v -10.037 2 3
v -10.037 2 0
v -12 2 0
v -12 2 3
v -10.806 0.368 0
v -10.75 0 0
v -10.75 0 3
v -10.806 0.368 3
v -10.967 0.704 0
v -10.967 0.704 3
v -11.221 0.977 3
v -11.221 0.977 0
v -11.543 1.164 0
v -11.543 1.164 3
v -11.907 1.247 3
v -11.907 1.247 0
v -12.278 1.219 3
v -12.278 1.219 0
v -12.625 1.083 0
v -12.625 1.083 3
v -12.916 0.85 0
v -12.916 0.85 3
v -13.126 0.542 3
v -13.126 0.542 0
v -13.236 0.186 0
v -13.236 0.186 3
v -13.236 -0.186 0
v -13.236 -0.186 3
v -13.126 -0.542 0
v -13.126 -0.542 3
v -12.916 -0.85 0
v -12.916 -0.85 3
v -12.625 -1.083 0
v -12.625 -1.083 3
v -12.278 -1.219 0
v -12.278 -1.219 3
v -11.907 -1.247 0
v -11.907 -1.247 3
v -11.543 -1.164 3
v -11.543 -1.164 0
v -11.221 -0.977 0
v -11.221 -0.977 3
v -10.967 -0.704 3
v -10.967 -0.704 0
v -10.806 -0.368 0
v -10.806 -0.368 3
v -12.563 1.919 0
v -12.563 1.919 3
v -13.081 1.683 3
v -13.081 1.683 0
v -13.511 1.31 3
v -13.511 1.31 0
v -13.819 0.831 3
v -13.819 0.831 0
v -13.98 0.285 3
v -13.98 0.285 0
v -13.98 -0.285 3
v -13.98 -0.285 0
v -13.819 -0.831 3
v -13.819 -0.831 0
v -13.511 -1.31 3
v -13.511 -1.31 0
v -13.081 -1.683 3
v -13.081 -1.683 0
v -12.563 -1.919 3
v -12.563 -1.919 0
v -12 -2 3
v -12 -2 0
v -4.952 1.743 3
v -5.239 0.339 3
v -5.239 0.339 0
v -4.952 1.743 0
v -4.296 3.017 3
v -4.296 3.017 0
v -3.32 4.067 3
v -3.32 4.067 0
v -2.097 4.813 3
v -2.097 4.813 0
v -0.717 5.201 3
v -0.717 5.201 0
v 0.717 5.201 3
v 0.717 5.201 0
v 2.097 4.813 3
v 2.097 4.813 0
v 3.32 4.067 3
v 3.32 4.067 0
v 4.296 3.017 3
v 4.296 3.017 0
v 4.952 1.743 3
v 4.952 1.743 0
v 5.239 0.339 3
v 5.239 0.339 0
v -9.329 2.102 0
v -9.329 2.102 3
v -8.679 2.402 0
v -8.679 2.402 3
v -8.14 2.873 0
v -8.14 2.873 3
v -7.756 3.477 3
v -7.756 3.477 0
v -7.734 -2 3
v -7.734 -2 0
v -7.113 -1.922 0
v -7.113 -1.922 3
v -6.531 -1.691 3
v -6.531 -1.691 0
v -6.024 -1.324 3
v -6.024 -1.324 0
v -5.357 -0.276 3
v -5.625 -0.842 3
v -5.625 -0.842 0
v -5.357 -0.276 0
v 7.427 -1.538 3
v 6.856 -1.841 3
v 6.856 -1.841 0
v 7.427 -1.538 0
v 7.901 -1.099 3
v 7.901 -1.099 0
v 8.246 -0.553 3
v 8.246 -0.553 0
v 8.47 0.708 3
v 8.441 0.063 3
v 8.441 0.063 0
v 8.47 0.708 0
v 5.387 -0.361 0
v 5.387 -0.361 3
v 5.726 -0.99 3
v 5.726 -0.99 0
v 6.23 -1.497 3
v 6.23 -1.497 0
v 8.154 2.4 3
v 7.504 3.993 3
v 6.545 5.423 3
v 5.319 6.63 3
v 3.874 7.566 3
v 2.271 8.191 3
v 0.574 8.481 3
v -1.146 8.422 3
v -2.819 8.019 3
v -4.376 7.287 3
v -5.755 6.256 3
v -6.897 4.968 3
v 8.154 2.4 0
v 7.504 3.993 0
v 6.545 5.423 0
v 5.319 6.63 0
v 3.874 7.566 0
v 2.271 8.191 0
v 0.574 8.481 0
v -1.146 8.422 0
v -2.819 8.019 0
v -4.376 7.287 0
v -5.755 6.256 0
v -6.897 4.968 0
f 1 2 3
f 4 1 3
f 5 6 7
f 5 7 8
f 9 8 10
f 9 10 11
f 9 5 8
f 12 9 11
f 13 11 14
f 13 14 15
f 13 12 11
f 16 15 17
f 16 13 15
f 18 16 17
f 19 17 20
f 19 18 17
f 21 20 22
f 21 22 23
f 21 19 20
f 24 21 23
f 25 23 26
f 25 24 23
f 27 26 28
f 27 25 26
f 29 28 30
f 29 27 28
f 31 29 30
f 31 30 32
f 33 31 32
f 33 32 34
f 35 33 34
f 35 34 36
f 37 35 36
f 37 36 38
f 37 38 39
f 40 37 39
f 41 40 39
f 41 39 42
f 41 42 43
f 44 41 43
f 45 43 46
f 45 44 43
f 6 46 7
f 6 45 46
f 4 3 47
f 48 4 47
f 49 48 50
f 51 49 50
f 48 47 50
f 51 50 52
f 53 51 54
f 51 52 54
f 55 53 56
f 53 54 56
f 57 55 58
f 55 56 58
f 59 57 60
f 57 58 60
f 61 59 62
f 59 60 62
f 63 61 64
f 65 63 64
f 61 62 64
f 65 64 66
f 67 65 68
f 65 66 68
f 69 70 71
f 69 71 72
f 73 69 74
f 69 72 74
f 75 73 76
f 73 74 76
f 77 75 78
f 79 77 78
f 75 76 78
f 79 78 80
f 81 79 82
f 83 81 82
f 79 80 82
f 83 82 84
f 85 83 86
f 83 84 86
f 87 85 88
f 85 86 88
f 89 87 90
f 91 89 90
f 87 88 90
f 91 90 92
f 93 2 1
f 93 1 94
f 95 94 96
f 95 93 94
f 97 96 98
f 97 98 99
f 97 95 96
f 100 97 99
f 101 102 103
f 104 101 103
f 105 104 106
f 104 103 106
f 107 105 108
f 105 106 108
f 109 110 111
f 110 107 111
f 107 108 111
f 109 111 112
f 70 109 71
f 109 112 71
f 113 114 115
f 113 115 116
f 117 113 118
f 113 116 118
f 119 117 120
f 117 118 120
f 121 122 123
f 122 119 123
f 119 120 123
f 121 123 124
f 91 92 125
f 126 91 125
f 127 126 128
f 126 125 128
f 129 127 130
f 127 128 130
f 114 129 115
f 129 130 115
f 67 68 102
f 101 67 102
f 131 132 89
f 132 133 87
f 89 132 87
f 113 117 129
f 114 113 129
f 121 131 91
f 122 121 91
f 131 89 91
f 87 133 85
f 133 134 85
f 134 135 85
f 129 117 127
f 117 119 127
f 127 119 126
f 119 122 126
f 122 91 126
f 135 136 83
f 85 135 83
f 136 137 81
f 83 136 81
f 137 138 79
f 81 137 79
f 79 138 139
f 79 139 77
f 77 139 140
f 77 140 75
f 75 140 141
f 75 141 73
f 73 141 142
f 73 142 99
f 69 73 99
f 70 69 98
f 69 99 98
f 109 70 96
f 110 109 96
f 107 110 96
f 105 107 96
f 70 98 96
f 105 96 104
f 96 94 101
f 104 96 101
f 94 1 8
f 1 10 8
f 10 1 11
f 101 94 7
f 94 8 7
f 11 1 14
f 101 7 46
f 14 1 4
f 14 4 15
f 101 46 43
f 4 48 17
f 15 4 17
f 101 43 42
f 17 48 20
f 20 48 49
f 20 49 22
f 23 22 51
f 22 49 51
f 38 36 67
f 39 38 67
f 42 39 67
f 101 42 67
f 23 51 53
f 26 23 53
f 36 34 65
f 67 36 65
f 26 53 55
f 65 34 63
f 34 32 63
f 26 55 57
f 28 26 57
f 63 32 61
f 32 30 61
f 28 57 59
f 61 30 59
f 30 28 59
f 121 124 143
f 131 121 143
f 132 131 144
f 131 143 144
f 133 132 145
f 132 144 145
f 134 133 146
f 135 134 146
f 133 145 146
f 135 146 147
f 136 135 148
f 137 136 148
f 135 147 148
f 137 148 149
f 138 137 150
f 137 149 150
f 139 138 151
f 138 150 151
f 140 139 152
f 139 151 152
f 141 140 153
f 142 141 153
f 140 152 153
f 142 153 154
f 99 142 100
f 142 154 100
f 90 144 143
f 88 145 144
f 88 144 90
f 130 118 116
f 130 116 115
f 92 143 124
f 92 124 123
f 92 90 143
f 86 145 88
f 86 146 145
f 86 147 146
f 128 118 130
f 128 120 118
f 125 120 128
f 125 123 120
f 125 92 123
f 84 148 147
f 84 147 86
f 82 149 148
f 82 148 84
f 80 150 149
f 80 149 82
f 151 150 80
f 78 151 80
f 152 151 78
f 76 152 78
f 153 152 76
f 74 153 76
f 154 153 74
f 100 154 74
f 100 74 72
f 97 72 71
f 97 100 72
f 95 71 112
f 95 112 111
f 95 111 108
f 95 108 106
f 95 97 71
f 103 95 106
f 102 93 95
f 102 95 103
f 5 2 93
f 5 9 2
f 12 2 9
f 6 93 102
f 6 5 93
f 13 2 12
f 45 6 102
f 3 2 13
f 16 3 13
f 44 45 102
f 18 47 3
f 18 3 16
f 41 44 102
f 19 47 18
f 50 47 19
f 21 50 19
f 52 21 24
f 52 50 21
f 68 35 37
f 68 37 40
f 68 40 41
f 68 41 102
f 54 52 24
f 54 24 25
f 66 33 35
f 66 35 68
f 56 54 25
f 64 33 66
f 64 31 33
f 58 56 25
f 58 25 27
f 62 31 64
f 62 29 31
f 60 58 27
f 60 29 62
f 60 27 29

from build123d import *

# Parameters (mm, degrees)
SKETCH_1_R      = 1.25
EXTRUDE_1_DEPTH = 3
FILLET_2_R      = 2.5


with BuildPart() as part:
    # Эскиз1 → Бобышка-Вытянуть1 (new body)
    with BuildSketch(Plane.XY):
        with BuildLine():
            Line((-12, -2), (-4.85412196, -2))
            ThreePointArc((-4.85412196, -2), (0, 5.25), (4.85412196, -2))
            Line((4.85412196, -2), (8.261355821, -2))
            ThreePointArc((8.261355821, -2), (2, 8.261355821), (-8.261355821, 2))
            Line((-8.261355821, 2), (-12, 2))
            ThreePointArc((-12, 2), (-14, 0), (-12, -2))
        make_face()
        with Locations((-12, 0)):
            Circle(SKETCH_1_R, mode=Mode.SUBTRACT)
    extrude(amount=EXTRUDE_1_DEPTH)

    # Скругление2
    # the kernel refuses this fillet: 2.5 mm, written as the material it adds along each edge
    with BuildSketch(Plane(origin=(-8.261355821, 2, 0), x_dir=(0.3235599082125896, 0.9462076863973683, 0), z_dir=(0, 0, 1))) as fillet_2_piece_1:
        with BuildLine():
            CenterArc((1.790852834, 2.489434763), FILLET_2_R, 198.878350274, 65.852260083)
            Line((-0.574666382, 1.680534992), (0, 0))
            ThreePointArc((0, 0), (0.780628158, 0.035921806), (1.561256317, 0))
        make_face()
    extrude(amount=3)
    # the kernel refuses this fillet: 2.5 mm, written as the material it takes off along each edge
    with BuildSketch(Plane(origin=(8.261355821, -2, -6.790979044), x_dir=(-1, 0, 0), z_dir=(0, 0, 1))) as fillet_2_2_piece_1:
        with BuildLine():
            CenterArc((2.282225449, -2.5), FILLET_2_R, 90, 94.780191847)
            ThreePointArc((-0.209078872, -2.708333333), (-0.21342859, -1.345760603), (0, 0))
            Line((0, 0), (2.282225449, 0))
        make_face()
    extrude(amount=16.581958087, mode=Mode.SUBTRACT)
    with BuildSketch(Plane(origin=(4.85412196, -2, -7.199330473), x_dir=(0.16240998892159433, 0.9867233632069768, 0), z_dir=(0, 0, 1))) as fillet_2_2_piece_2:
        with BuildLine():
            CenterArc((2.934505681, -2.435474059), FILLET_2_R, 103.045879434, 86.300928937)
            Line((0.467697273, -2.841499031), (0, 0))
            ThreePointArc((0, 0), (1.185088833, -0.135504477), (2.370177665, 0))
        make_face()
    extrude(amount=17.398660947, mode=Mode.SUBTRACT)
    with BuildSketch(Plane(origin=(-4.85412196, -2, -7.199330473), x_dir=(-1, 0, 0), z_dir=(0, 0, 1))) as fillet_2_2_piece_3:
        with BuildLine():
            CenterArc((2.879732189, -2.5), FILLET_2_R, 90, 86.300928937)
            ThreePointArc((0.384940528, -2.338709677), (0.326175697, -1.147347558), (0, 0))
            Line((0, 0), (2.879732189, 0))
        make_face()
    extrude(amount=17.398660947, mode=Mode.SUBTRACT)


solid = part.part
